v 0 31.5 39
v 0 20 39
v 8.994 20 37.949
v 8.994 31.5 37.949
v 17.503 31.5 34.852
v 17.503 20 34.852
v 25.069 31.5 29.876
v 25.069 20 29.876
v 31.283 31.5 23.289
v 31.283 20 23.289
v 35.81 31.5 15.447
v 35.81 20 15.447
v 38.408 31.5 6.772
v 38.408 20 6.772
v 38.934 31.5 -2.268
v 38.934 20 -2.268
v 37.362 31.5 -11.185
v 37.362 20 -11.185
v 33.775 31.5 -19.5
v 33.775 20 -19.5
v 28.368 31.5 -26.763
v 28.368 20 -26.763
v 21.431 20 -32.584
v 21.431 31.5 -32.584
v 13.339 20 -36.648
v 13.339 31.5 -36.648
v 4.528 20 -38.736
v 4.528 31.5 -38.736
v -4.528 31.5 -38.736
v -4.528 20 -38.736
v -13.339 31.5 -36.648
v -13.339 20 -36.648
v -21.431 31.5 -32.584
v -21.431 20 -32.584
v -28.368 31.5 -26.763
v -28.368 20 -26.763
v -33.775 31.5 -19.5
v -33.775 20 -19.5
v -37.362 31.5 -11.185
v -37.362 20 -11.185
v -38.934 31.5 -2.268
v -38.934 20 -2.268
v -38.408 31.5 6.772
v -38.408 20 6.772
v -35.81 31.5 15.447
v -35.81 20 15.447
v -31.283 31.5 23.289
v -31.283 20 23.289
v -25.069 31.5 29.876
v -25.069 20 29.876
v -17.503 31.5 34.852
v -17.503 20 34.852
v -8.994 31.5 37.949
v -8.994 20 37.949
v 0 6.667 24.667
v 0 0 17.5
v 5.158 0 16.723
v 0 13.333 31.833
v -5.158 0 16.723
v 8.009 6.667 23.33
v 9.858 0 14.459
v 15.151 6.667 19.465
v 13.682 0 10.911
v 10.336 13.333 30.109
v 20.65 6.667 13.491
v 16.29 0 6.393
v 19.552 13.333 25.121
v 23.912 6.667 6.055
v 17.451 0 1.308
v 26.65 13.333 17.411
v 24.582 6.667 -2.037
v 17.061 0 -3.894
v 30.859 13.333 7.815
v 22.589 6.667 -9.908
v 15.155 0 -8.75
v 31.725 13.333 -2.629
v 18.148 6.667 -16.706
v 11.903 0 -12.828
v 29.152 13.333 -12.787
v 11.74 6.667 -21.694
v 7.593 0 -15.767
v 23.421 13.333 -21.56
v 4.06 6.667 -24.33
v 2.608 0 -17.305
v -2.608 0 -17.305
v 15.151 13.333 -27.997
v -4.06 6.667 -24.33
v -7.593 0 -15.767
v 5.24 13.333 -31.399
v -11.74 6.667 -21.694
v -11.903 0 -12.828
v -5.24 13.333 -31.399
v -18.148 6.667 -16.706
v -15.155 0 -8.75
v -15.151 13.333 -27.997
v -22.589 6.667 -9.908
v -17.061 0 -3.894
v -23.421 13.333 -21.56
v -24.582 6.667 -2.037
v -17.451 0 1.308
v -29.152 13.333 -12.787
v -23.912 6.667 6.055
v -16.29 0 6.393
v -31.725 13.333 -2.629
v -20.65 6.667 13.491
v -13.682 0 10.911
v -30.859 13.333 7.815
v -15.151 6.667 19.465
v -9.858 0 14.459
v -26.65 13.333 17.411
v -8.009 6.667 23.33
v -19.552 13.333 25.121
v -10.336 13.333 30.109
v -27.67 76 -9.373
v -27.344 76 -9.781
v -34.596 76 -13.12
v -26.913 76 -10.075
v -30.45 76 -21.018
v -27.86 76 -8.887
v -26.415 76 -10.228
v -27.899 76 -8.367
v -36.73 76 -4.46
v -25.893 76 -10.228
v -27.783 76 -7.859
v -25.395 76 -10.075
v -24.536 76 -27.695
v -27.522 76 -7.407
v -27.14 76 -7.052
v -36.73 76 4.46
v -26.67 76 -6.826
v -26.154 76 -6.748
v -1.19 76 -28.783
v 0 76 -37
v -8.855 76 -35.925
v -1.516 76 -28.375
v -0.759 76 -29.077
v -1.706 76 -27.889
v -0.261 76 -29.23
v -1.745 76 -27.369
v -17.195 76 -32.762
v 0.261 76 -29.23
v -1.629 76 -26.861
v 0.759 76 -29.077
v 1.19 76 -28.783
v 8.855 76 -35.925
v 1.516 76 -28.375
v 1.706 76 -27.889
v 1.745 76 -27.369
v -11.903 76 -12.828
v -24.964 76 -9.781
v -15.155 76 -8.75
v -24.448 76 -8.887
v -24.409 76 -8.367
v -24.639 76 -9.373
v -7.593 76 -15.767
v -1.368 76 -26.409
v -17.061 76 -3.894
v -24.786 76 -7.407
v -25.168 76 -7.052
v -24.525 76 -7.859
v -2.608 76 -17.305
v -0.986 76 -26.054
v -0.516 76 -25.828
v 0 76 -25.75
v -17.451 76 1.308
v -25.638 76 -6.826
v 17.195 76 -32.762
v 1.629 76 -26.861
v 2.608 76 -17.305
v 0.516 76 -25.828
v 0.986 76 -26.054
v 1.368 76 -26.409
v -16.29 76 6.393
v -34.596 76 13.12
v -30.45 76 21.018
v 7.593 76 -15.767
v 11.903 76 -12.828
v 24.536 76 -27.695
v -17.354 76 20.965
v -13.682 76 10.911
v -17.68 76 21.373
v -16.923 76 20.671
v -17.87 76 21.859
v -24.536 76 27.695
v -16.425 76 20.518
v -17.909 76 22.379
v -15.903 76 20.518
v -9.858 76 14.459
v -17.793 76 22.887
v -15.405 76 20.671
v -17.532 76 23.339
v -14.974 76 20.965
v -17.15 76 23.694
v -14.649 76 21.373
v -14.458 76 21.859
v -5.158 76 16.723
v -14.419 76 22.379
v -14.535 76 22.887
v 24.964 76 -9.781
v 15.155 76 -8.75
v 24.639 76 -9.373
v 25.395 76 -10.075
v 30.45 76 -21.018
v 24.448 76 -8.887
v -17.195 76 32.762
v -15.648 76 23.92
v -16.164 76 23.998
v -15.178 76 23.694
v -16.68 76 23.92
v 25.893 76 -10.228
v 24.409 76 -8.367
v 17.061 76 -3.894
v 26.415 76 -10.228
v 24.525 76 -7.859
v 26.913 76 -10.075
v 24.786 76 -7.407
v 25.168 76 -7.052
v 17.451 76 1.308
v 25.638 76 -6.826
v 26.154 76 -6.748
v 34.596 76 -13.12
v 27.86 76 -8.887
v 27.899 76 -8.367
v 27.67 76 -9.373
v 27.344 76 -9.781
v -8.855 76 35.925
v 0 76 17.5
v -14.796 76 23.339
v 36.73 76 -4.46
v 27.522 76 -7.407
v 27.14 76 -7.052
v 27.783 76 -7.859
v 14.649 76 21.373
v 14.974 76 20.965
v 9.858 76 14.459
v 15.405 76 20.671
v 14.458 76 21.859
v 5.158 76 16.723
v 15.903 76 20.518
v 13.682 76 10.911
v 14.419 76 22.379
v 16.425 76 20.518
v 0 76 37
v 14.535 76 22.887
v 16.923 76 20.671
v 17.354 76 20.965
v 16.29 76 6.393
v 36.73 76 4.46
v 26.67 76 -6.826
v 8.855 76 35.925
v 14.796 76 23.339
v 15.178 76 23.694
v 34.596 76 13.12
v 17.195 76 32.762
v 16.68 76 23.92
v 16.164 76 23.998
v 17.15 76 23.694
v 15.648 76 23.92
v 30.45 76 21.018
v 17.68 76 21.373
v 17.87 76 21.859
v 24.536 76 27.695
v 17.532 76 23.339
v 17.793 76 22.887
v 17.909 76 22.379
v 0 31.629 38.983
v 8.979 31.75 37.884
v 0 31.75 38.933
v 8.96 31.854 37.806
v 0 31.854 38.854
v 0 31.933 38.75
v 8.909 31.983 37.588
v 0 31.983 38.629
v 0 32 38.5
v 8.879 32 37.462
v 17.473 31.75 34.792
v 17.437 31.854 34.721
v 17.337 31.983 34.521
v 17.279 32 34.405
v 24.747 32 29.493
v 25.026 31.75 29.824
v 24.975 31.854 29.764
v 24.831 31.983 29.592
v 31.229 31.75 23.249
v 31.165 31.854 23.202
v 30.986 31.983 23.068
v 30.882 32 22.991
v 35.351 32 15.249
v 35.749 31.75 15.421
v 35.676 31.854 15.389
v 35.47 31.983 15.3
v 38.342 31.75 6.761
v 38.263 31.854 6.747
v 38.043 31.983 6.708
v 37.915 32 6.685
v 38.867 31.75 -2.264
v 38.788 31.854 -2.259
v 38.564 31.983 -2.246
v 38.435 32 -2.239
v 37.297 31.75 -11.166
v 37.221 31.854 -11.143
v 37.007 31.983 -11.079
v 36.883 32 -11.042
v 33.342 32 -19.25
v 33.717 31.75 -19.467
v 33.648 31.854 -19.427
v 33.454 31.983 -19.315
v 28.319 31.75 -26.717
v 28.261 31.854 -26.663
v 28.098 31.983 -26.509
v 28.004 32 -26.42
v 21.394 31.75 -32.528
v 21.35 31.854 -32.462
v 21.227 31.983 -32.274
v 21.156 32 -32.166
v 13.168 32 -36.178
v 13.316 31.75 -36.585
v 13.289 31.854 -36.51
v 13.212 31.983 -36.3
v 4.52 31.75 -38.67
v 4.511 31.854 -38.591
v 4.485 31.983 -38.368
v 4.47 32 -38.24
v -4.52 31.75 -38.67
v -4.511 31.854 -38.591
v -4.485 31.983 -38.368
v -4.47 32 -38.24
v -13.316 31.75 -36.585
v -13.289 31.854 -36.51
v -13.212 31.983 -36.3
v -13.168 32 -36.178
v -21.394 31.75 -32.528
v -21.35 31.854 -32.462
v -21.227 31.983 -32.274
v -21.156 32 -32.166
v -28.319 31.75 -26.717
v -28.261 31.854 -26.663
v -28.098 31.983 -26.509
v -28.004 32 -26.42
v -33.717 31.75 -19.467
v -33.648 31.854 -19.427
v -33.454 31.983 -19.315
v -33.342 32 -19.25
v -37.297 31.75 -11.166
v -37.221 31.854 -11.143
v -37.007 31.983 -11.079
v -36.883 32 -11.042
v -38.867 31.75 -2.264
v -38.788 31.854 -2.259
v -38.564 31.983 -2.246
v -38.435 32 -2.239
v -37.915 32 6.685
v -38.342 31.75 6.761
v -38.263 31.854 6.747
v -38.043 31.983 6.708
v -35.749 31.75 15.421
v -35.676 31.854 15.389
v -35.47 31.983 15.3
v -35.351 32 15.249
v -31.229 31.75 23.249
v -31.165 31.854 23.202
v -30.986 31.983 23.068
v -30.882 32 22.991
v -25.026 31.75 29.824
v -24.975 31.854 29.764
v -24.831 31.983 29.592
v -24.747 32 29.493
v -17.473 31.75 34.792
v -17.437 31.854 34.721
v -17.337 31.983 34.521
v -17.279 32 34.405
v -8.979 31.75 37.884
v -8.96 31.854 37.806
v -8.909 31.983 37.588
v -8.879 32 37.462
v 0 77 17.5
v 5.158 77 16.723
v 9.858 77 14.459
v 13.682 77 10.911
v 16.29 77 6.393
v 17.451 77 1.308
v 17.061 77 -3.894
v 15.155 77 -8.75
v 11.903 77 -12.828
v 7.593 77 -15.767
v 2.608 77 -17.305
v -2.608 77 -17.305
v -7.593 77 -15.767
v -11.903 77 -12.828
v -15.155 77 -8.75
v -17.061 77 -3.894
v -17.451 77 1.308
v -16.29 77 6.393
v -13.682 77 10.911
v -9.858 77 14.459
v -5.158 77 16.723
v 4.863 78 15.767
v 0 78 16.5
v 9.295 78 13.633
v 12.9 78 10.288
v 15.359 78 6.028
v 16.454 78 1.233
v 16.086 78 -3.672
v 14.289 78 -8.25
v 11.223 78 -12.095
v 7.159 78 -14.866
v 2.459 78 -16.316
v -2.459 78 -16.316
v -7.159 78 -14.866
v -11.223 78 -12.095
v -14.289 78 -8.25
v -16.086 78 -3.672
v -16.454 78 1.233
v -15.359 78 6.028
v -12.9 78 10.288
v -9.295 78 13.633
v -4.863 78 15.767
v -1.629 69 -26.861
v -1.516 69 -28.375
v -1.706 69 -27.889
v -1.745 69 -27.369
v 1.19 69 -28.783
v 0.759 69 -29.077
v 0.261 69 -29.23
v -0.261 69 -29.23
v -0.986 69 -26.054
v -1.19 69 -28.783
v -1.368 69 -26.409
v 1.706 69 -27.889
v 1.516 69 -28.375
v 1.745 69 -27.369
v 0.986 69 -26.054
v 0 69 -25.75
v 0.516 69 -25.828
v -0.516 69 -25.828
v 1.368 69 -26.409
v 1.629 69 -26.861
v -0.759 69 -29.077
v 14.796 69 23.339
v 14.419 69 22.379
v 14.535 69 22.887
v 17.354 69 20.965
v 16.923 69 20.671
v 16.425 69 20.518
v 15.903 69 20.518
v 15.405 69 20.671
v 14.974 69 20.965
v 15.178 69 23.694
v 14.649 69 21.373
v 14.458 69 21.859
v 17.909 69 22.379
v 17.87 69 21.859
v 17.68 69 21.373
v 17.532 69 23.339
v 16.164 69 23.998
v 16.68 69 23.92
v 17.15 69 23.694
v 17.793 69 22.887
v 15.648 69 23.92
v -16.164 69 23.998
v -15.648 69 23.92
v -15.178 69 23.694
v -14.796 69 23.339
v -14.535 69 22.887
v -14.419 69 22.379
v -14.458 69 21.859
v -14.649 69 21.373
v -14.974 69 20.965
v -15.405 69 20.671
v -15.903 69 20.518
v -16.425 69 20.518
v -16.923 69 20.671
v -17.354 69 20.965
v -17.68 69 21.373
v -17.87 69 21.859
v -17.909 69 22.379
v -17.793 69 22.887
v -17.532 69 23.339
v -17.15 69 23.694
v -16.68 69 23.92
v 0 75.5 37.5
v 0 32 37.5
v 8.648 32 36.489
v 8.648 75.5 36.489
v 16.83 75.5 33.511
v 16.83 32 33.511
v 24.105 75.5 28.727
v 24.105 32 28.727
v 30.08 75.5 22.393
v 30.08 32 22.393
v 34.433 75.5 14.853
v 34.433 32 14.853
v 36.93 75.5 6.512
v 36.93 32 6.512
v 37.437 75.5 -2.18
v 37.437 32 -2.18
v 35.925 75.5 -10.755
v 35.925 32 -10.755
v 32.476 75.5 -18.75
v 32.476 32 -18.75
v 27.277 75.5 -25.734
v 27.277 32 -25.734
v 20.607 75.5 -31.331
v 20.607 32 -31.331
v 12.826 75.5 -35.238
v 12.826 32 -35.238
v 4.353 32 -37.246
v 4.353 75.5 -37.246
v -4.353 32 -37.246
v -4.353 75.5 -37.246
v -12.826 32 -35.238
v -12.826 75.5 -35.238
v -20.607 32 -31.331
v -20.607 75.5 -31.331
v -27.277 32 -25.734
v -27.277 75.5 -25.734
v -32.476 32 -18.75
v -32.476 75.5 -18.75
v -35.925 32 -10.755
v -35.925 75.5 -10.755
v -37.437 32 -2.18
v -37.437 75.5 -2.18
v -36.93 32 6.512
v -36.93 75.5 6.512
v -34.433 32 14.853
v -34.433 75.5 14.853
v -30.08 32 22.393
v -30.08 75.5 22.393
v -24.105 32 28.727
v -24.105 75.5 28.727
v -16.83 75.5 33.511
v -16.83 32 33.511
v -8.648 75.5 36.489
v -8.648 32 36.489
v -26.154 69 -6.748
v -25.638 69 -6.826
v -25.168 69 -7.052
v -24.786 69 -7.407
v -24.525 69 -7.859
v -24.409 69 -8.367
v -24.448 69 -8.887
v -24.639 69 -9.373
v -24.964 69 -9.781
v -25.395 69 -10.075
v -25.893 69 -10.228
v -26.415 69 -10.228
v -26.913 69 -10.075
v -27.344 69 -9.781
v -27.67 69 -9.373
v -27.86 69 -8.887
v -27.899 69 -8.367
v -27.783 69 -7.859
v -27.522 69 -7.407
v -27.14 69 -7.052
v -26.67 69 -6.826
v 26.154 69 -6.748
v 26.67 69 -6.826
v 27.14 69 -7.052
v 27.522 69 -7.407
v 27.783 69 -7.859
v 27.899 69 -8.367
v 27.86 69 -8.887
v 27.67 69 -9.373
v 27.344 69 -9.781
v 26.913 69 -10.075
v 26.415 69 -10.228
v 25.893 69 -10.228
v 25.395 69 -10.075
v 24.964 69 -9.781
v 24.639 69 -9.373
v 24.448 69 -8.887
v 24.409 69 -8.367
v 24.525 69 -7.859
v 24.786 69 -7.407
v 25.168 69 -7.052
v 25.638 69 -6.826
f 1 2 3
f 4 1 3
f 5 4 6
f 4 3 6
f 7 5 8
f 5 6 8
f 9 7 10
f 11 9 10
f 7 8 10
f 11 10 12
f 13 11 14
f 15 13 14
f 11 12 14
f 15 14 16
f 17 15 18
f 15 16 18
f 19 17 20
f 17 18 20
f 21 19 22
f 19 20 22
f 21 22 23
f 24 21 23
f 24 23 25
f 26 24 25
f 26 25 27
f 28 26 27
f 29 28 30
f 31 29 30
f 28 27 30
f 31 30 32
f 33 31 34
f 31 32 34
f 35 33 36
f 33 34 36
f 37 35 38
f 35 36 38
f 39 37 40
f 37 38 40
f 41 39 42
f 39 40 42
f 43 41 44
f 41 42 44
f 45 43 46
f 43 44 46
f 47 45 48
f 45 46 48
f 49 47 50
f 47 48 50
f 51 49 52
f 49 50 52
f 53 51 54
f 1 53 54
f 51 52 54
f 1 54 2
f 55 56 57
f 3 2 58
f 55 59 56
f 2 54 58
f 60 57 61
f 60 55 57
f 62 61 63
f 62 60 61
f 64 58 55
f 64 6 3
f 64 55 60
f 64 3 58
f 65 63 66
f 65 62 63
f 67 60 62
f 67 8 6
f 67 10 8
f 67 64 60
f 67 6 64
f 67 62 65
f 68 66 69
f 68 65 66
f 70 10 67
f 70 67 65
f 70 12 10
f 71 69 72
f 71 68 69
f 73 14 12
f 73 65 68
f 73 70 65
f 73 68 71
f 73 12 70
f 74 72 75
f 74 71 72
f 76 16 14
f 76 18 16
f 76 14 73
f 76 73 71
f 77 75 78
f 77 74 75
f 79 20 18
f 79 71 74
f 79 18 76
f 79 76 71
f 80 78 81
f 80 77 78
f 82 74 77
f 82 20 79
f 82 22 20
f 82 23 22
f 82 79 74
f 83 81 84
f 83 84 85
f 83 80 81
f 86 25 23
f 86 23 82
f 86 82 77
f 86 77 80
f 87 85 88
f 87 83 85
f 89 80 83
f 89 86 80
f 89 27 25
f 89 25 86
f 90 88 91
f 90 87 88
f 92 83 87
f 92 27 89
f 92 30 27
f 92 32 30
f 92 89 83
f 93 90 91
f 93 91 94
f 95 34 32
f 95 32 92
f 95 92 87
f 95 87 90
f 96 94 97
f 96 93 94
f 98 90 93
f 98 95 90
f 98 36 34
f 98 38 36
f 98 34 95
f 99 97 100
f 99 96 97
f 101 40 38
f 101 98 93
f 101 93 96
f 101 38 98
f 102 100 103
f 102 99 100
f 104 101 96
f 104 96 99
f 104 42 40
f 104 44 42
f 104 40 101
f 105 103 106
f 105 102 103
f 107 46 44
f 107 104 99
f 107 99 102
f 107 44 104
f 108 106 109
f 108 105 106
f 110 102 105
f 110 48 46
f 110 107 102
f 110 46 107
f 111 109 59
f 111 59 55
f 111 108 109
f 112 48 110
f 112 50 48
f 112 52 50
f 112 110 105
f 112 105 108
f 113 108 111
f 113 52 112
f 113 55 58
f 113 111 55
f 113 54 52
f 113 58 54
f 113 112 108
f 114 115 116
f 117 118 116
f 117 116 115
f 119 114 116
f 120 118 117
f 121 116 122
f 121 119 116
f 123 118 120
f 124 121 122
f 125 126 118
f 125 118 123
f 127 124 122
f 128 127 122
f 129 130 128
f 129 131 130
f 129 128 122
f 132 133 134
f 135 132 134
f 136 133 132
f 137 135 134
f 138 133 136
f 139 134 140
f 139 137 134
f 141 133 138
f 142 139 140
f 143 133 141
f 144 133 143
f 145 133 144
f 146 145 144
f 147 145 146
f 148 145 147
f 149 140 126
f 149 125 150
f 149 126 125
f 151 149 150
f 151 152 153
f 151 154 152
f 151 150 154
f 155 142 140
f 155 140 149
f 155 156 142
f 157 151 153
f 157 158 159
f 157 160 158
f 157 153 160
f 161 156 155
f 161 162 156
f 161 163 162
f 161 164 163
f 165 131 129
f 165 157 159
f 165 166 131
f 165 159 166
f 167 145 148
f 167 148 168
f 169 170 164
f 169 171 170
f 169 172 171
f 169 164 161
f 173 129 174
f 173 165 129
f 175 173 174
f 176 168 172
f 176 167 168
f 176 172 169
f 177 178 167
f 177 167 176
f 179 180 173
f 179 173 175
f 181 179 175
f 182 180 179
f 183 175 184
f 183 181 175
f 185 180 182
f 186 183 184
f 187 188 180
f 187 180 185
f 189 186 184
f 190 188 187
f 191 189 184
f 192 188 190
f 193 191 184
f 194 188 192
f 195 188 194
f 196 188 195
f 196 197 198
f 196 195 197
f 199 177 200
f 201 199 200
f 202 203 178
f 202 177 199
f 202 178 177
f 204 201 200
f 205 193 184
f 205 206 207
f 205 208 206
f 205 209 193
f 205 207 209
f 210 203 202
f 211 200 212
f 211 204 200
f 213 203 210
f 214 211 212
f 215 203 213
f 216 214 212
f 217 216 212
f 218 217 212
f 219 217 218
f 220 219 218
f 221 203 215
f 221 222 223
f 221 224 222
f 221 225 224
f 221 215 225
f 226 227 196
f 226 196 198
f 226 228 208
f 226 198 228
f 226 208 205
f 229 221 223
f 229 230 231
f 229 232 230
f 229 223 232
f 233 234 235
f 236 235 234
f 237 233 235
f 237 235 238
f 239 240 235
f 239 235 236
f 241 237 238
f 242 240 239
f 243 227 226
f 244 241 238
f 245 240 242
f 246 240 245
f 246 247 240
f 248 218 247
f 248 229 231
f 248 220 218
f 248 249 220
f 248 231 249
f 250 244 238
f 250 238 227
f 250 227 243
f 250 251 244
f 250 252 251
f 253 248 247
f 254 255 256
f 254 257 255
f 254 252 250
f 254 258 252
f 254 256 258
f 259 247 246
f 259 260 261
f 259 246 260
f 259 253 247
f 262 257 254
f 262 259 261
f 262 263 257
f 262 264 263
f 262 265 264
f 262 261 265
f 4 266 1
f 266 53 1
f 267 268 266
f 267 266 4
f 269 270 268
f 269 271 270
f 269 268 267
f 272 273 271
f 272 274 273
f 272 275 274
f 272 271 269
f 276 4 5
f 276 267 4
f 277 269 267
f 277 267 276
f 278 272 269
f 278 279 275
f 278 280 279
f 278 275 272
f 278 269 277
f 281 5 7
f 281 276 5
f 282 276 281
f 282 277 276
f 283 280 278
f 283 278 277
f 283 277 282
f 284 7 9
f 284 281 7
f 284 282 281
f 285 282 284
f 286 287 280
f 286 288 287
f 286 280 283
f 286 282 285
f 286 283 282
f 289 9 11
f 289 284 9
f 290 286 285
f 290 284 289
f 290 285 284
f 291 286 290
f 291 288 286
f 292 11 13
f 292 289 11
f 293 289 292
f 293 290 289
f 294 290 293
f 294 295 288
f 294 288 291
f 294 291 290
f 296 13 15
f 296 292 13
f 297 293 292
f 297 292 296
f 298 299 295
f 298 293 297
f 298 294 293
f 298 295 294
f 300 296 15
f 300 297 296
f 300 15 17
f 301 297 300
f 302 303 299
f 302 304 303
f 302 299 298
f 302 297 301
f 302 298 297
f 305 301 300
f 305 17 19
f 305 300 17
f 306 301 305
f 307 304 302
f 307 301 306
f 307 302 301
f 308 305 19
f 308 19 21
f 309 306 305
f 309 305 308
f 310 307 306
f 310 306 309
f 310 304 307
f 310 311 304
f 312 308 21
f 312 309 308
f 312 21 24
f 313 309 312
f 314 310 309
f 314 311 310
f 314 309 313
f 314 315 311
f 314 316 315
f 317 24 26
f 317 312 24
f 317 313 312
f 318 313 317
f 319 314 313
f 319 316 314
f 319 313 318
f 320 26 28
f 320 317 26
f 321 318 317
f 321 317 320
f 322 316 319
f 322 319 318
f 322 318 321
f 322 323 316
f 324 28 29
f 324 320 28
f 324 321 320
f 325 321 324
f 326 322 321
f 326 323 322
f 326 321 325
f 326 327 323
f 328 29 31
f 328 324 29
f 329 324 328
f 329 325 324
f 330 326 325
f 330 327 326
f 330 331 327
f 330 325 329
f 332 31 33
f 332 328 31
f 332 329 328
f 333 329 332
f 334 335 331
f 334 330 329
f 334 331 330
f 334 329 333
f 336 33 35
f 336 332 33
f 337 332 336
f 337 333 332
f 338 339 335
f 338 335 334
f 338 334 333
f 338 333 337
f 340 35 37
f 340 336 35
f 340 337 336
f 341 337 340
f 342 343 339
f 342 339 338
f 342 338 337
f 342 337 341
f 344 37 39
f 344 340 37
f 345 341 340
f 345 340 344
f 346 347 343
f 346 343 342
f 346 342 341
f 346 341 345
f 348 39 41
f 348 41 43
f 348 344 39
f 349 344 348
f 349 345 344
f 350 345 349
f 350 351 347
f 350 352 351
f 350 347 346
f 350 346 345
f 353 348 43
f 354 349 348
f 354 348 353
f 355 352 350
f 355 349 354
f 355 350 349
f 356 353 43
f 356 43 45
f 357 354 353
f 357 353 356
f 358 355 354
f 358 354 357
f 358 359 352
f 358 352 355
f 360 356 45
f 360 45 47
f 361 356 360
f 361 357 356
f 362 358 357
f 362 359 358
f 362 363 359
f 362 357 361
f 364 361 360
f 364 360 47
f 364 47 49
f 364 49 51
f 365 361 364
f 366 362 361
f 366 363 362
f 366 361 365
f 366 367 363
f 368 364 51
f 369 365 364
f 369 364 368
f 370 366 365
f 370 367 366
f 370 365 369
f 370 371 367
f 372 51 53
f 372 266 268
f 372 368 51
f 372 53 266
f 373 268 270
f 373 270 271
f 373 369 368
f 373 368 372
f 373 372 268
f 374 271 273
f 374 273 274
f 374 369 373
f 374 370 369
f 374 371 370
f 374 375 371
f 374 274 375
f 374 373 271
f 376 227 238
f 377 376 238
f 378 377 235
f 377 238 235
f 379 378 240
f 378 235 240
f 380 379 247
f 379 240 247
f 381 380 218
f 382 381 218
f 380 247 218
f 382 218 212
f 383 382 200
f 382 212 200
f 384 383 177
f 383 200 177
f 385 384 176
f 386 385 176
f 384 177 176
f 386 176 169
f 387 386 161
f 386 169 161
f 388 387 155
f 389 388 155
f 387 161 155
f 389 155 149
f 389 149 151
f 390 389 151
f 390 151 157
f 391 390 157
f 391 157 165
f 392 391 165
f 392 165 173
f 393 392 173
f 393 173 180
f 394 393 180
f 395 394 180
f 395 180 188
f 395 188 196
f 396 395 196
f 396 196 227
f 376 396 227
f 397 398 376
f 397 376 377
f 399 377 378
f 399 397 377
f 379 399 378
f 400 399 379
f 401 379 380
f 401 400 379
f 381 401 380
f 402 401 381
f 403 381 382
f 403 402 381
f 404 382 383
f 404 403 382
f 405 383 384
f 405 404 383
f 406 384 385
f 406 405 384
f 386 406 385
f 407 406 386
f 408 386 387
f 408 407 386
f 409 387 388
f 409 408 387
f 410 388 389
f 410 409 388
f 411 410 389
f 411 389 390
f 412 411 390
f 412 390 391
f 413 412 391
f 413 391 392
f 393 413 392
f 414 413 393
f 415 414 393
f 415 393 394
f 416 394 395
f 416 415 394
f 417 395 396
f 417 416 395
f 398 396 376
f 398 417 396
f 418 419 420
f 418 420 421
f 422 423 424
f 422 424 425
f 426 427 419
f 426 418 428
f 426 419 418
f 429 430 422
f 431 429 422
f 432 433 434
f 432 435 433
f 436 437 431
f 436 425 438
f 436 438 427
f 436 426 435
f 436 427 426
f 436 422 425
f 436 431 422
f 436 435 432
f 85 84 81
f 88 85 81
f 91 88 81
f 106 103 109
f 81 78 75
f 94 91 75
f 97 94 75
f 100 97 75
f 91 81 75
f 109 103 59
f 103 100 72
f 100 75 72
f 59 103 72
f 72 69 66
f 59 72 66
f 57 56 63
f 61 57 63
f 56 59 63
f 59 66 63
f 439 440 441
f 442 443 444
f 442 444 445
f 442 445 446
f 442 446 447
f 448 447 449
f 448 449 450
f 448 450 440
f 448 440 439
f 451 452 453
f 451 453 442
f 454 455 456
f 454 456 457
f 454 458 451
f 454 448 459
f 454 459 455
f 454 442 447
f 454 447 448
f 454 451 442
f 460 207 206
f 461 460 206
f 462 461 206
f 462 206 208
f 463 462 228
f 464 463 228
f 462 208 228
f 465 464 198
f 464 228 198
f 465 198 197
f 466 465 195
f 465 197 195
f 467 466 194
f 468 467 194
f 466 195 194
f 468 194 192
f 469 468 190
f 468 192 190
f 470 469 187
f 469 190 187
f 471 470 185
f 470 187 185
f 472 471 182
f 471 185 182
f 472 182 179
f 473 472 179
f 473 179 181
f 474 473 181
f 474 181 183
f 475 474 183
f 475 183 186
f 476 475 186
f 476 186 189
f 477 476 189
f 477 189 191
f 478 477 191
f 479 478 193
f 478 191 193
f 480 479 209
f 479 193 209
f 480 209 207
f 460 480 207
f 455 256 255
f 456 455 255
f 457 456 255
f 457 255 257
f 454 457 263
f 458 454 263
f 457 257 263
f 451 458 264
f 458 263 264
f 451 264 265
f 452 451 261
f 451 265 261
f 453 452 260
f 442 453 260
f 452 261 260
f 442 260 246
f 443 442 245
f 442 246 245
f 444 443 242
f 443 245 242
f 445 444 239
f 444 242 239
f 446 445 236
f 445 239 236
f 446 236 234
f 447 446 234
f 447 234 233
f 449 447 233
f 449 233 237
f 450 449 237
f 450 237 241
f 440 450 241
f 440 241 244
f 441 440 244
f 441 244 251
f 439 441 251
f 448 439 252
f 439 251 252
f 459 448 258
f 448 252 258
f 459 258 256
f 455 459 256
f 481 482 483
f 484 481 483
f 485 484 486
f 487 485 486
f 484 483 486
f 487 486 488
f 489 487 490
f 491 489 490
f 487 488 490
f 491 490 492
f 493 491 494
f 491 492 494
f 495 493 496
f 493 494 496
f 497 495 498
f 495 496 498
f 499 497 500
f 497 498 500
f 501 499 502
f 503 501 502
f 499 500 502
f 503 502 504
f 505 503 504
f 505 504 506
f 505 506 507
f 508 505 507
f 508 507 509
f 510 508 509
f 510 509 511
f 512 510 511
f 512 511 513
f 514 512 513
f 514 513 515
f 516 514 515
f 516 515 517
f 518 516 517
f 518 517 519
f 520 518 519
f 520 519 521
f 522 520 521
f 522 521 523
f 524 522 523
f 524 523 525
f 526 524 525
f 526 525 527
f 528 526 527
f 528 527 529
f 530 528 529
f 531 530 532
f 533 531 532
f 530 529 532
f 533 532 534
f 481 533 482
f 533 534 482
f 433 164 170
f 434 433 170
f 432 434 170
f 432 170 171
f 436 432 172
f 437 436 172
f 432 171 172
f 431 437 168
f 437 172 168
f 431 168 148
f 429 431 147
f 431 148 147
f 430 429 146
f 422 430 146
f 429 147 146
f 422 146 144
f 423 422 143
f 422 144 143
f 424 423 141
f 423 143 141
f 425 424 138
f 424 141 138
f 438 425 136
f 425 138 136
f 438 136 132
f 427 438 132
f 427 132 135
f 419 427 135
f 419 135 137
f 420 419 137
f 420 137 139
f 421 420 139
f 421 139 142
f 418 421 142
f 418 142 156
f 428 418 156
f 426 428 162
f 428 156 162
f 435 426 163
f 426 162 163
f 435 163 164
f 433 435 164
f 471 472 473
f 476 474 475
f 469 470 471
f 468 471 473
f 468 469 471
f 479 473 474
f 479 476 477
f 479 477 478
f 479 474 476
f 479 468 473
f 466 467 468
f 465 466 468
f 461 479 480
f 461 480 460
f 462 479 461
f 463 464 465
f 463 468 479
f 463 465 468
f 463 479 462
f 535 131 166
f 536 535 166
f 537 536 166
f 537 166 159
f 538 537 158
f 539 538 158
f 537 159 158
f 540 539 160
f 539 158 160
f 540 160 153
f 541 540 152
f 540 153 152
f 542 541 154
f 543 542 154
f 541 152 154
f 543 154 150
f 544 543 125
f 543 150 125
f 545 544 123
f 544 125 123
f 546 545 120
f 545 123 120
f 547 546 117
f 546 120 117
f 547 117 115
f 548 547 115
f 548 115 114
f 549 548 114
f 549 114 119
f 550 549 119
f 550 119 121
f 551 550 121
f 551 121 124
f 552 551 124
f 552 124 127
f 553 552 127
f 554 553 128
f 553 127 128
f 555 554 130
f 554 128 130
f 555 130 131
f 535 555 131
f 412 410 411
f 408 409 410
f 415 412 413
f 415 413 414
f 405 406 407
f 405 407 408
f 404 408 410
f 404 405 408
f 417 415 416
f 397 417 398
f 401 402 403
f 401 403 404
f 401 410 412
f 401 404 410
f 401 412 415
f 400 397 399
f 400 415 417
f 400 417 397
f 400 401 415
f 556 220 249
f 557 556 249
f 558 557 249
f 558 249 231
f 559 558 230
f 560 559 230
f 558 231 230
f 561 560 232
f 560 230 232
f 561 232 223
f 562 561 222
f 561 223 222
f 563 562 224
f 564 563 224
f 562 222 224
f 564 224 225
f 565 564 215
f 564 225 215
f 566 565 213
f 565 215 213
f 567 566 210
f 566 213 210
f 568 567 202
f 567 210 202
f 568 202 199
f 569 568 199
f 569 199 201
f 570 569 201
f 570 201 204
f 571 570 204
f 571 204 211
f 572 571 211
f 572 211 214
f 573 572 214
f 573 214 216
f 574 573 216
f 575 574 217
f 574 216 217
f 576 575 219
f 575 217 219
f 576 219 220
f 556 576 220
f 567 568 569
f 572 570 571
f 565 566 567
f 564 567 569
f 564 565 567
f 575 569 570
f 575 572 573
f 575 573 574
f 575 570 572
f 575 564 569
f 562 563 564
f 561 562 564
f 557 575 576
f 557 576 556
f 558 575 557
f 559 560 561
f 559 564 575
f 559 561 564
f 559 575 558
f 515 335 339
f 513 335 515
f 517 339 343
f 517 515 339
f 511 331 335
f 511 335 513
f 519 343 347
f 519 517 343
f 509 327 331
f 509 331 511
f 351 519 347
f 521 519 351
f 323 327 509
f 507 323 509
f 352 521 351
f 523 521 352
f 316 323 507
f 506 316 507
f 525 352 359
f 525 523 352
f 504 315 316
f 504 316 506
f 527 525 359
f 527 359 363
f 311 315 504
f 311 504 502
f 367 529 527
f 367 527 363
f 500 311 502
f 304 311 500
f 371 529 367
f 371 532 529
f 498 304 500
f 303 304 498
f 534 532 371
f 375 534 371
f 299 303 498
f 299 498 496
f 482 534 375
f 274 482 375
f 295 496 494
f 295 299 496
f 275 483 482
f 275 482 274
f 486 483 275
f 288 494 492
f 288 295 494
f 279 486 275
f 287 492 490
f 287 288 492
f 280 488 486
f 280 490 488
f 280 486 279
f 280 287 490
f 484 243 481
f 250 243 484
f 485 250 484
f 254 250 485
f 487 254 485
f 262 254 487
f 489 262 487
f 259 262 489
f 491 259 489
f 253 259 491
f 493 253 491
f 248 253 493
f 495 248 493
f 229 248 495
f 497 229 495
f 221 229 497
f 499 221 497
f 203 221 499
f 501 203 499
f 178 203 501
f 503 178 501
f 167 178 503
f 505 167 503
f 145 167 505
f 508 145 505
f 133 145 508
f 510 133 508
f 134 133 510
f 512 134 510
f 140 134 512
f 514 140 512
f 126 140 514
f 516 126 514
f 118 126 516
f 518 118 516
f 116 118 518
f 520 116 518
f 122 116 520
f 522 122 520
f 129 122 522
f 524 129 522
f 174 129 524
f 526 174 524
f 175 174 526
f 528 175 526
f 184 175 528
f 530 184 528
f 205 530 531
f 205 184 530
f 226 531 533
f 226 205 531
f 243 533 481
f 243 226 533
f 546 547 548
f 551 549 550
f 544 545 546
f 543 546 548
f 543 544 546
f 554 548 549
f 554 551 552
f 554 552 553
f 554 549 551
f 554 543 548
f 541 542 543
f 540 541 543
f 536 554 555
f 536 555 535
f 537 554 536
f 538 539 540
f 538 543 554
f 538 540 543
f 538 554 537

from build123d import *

# Parameters (mm, degrees)
SKETCH1_R           = 37.5
SKETCH1_R_2         = 17.5
BOSS_EXTRUDE1_DEPTH = 76
SKETCH1_3_R         = 17.5
BOSS_EXTRUDE2_DEPTH = 78
SKETCH1_4_R         = 39
SKETCH1_4_R_2       = 37.5
BOSS_EXTRUDE3_DEPTH = 32
SKETCH2_R           = 1.75
CUT_EXTRUDE1_DEPTH  = 7
FILLET1_R           = 0.5
CHAMFER1_SIZE       = 0.5
CHAMFER2_SIZE       = 21.5
CHAMFER2_SIZE2      = 20
CHAMFER3_SIZE       = 1


with BuildPart() as part:
    # Sketch1 → Boss-Extrude1 (new body)
    with BuildSketch(Plane(origin=(0, 0, 0), x_dir=(1, 0, 0), z_dir=(0, 1, 0))):
        Circle(SKETCH1_R)
        Circle(SKETCH1_R_2, mode=Mode.SUBTRACT)
    extrude(amount=BOSS_EXTRUDE1_DEPTH)

    # Sketch1<3> → Boss-Extrude2 (add)
    with BuildSketch(Plane(origin=(0, 0, 0), x_dir=(1, 0, 0), z_dir=(0, 1, 0))):
        Circle(SKETCH1_3_R)
    extrude(amount=BOSS_EXTRUDE2_DEPTH)

    # Sketch1<4> → Boss-Extrude3 (add)
    with BuildSketch(Plane(origin=(0, 0, 0), x_dir=(1, 0, 0), z_dir=(0, 1, 0))):
        Circle(SKETCH1_4_R)
        Circle(SKETCH1_4_R_2, mode=Mode.SUBTRACT)
    extrude(amount=BOSS_EXTRUDE3_DEPTH)

    # Sketch2 → Cut-Extrude1 (cut)
    with BuildSketch(Plane(origin=(0, 76, 0), x_dir=(1, 0, 0), z_dir=(0, 1, 0))):
        with Locations((0, 27.5)):
            Circle(SKETCH2_R)
        with Locations((26.154054198, 8.497967345)):
            Circle(SKETCH2_R)
        with Locations((16.164094438, -22.247967345)):
            Circle(SKETCH2_R)
        with Locations((-16.164094438, -22.247967345)):
            Circle(SKETCH2_R)
        with Locations((-26.154054198, 8.497967345)):
            Circle(SKETCH2_R)
    extrude(amount=-CUT_EXTRUDE1_DEPTH, mode=Mode.SUBTRACT)

    # Fillet1
    fillet1_edges = [part.edges().sort_by_distance(p)[0] for p in [
        (-39, 32, 0),
    ]]
    fillet(fillet1_edges, radius=FILLET1_R)

    # Chamfer1
    chamfer1_edges = [part.edges().sort_by_distance(p)[0] for p in [
        (-37.5, 76, 0),
    ]]
    chamfer(chamfer1_edges, length=CHAMFER1_SIZE)

    # Chamfer2
    chamfer2_edges = [part.edges().sort_by_distance(p)[0] for p in [
        (-39, 0, 0),
    ]]
    chamfer2_side = [part.faces().sort_by_distance(p)[0] for p in [
        (0, 0, 0),
    ]]
    chamfer(chamfer2_edges, length=CHAMFER2_SIZE, length2=CHAMFER2_SIZE2, reference=chamfer2_side[0])

    # Chamfer3
    chamfer3_edges = [part.edges().sort_by_distance(p)[0] for p in [
        (-17.5, 78, 0),
    ]]
    chamfer(chamfer3_edges, length=CHAMFER3_SIZE)


solid = part.part
